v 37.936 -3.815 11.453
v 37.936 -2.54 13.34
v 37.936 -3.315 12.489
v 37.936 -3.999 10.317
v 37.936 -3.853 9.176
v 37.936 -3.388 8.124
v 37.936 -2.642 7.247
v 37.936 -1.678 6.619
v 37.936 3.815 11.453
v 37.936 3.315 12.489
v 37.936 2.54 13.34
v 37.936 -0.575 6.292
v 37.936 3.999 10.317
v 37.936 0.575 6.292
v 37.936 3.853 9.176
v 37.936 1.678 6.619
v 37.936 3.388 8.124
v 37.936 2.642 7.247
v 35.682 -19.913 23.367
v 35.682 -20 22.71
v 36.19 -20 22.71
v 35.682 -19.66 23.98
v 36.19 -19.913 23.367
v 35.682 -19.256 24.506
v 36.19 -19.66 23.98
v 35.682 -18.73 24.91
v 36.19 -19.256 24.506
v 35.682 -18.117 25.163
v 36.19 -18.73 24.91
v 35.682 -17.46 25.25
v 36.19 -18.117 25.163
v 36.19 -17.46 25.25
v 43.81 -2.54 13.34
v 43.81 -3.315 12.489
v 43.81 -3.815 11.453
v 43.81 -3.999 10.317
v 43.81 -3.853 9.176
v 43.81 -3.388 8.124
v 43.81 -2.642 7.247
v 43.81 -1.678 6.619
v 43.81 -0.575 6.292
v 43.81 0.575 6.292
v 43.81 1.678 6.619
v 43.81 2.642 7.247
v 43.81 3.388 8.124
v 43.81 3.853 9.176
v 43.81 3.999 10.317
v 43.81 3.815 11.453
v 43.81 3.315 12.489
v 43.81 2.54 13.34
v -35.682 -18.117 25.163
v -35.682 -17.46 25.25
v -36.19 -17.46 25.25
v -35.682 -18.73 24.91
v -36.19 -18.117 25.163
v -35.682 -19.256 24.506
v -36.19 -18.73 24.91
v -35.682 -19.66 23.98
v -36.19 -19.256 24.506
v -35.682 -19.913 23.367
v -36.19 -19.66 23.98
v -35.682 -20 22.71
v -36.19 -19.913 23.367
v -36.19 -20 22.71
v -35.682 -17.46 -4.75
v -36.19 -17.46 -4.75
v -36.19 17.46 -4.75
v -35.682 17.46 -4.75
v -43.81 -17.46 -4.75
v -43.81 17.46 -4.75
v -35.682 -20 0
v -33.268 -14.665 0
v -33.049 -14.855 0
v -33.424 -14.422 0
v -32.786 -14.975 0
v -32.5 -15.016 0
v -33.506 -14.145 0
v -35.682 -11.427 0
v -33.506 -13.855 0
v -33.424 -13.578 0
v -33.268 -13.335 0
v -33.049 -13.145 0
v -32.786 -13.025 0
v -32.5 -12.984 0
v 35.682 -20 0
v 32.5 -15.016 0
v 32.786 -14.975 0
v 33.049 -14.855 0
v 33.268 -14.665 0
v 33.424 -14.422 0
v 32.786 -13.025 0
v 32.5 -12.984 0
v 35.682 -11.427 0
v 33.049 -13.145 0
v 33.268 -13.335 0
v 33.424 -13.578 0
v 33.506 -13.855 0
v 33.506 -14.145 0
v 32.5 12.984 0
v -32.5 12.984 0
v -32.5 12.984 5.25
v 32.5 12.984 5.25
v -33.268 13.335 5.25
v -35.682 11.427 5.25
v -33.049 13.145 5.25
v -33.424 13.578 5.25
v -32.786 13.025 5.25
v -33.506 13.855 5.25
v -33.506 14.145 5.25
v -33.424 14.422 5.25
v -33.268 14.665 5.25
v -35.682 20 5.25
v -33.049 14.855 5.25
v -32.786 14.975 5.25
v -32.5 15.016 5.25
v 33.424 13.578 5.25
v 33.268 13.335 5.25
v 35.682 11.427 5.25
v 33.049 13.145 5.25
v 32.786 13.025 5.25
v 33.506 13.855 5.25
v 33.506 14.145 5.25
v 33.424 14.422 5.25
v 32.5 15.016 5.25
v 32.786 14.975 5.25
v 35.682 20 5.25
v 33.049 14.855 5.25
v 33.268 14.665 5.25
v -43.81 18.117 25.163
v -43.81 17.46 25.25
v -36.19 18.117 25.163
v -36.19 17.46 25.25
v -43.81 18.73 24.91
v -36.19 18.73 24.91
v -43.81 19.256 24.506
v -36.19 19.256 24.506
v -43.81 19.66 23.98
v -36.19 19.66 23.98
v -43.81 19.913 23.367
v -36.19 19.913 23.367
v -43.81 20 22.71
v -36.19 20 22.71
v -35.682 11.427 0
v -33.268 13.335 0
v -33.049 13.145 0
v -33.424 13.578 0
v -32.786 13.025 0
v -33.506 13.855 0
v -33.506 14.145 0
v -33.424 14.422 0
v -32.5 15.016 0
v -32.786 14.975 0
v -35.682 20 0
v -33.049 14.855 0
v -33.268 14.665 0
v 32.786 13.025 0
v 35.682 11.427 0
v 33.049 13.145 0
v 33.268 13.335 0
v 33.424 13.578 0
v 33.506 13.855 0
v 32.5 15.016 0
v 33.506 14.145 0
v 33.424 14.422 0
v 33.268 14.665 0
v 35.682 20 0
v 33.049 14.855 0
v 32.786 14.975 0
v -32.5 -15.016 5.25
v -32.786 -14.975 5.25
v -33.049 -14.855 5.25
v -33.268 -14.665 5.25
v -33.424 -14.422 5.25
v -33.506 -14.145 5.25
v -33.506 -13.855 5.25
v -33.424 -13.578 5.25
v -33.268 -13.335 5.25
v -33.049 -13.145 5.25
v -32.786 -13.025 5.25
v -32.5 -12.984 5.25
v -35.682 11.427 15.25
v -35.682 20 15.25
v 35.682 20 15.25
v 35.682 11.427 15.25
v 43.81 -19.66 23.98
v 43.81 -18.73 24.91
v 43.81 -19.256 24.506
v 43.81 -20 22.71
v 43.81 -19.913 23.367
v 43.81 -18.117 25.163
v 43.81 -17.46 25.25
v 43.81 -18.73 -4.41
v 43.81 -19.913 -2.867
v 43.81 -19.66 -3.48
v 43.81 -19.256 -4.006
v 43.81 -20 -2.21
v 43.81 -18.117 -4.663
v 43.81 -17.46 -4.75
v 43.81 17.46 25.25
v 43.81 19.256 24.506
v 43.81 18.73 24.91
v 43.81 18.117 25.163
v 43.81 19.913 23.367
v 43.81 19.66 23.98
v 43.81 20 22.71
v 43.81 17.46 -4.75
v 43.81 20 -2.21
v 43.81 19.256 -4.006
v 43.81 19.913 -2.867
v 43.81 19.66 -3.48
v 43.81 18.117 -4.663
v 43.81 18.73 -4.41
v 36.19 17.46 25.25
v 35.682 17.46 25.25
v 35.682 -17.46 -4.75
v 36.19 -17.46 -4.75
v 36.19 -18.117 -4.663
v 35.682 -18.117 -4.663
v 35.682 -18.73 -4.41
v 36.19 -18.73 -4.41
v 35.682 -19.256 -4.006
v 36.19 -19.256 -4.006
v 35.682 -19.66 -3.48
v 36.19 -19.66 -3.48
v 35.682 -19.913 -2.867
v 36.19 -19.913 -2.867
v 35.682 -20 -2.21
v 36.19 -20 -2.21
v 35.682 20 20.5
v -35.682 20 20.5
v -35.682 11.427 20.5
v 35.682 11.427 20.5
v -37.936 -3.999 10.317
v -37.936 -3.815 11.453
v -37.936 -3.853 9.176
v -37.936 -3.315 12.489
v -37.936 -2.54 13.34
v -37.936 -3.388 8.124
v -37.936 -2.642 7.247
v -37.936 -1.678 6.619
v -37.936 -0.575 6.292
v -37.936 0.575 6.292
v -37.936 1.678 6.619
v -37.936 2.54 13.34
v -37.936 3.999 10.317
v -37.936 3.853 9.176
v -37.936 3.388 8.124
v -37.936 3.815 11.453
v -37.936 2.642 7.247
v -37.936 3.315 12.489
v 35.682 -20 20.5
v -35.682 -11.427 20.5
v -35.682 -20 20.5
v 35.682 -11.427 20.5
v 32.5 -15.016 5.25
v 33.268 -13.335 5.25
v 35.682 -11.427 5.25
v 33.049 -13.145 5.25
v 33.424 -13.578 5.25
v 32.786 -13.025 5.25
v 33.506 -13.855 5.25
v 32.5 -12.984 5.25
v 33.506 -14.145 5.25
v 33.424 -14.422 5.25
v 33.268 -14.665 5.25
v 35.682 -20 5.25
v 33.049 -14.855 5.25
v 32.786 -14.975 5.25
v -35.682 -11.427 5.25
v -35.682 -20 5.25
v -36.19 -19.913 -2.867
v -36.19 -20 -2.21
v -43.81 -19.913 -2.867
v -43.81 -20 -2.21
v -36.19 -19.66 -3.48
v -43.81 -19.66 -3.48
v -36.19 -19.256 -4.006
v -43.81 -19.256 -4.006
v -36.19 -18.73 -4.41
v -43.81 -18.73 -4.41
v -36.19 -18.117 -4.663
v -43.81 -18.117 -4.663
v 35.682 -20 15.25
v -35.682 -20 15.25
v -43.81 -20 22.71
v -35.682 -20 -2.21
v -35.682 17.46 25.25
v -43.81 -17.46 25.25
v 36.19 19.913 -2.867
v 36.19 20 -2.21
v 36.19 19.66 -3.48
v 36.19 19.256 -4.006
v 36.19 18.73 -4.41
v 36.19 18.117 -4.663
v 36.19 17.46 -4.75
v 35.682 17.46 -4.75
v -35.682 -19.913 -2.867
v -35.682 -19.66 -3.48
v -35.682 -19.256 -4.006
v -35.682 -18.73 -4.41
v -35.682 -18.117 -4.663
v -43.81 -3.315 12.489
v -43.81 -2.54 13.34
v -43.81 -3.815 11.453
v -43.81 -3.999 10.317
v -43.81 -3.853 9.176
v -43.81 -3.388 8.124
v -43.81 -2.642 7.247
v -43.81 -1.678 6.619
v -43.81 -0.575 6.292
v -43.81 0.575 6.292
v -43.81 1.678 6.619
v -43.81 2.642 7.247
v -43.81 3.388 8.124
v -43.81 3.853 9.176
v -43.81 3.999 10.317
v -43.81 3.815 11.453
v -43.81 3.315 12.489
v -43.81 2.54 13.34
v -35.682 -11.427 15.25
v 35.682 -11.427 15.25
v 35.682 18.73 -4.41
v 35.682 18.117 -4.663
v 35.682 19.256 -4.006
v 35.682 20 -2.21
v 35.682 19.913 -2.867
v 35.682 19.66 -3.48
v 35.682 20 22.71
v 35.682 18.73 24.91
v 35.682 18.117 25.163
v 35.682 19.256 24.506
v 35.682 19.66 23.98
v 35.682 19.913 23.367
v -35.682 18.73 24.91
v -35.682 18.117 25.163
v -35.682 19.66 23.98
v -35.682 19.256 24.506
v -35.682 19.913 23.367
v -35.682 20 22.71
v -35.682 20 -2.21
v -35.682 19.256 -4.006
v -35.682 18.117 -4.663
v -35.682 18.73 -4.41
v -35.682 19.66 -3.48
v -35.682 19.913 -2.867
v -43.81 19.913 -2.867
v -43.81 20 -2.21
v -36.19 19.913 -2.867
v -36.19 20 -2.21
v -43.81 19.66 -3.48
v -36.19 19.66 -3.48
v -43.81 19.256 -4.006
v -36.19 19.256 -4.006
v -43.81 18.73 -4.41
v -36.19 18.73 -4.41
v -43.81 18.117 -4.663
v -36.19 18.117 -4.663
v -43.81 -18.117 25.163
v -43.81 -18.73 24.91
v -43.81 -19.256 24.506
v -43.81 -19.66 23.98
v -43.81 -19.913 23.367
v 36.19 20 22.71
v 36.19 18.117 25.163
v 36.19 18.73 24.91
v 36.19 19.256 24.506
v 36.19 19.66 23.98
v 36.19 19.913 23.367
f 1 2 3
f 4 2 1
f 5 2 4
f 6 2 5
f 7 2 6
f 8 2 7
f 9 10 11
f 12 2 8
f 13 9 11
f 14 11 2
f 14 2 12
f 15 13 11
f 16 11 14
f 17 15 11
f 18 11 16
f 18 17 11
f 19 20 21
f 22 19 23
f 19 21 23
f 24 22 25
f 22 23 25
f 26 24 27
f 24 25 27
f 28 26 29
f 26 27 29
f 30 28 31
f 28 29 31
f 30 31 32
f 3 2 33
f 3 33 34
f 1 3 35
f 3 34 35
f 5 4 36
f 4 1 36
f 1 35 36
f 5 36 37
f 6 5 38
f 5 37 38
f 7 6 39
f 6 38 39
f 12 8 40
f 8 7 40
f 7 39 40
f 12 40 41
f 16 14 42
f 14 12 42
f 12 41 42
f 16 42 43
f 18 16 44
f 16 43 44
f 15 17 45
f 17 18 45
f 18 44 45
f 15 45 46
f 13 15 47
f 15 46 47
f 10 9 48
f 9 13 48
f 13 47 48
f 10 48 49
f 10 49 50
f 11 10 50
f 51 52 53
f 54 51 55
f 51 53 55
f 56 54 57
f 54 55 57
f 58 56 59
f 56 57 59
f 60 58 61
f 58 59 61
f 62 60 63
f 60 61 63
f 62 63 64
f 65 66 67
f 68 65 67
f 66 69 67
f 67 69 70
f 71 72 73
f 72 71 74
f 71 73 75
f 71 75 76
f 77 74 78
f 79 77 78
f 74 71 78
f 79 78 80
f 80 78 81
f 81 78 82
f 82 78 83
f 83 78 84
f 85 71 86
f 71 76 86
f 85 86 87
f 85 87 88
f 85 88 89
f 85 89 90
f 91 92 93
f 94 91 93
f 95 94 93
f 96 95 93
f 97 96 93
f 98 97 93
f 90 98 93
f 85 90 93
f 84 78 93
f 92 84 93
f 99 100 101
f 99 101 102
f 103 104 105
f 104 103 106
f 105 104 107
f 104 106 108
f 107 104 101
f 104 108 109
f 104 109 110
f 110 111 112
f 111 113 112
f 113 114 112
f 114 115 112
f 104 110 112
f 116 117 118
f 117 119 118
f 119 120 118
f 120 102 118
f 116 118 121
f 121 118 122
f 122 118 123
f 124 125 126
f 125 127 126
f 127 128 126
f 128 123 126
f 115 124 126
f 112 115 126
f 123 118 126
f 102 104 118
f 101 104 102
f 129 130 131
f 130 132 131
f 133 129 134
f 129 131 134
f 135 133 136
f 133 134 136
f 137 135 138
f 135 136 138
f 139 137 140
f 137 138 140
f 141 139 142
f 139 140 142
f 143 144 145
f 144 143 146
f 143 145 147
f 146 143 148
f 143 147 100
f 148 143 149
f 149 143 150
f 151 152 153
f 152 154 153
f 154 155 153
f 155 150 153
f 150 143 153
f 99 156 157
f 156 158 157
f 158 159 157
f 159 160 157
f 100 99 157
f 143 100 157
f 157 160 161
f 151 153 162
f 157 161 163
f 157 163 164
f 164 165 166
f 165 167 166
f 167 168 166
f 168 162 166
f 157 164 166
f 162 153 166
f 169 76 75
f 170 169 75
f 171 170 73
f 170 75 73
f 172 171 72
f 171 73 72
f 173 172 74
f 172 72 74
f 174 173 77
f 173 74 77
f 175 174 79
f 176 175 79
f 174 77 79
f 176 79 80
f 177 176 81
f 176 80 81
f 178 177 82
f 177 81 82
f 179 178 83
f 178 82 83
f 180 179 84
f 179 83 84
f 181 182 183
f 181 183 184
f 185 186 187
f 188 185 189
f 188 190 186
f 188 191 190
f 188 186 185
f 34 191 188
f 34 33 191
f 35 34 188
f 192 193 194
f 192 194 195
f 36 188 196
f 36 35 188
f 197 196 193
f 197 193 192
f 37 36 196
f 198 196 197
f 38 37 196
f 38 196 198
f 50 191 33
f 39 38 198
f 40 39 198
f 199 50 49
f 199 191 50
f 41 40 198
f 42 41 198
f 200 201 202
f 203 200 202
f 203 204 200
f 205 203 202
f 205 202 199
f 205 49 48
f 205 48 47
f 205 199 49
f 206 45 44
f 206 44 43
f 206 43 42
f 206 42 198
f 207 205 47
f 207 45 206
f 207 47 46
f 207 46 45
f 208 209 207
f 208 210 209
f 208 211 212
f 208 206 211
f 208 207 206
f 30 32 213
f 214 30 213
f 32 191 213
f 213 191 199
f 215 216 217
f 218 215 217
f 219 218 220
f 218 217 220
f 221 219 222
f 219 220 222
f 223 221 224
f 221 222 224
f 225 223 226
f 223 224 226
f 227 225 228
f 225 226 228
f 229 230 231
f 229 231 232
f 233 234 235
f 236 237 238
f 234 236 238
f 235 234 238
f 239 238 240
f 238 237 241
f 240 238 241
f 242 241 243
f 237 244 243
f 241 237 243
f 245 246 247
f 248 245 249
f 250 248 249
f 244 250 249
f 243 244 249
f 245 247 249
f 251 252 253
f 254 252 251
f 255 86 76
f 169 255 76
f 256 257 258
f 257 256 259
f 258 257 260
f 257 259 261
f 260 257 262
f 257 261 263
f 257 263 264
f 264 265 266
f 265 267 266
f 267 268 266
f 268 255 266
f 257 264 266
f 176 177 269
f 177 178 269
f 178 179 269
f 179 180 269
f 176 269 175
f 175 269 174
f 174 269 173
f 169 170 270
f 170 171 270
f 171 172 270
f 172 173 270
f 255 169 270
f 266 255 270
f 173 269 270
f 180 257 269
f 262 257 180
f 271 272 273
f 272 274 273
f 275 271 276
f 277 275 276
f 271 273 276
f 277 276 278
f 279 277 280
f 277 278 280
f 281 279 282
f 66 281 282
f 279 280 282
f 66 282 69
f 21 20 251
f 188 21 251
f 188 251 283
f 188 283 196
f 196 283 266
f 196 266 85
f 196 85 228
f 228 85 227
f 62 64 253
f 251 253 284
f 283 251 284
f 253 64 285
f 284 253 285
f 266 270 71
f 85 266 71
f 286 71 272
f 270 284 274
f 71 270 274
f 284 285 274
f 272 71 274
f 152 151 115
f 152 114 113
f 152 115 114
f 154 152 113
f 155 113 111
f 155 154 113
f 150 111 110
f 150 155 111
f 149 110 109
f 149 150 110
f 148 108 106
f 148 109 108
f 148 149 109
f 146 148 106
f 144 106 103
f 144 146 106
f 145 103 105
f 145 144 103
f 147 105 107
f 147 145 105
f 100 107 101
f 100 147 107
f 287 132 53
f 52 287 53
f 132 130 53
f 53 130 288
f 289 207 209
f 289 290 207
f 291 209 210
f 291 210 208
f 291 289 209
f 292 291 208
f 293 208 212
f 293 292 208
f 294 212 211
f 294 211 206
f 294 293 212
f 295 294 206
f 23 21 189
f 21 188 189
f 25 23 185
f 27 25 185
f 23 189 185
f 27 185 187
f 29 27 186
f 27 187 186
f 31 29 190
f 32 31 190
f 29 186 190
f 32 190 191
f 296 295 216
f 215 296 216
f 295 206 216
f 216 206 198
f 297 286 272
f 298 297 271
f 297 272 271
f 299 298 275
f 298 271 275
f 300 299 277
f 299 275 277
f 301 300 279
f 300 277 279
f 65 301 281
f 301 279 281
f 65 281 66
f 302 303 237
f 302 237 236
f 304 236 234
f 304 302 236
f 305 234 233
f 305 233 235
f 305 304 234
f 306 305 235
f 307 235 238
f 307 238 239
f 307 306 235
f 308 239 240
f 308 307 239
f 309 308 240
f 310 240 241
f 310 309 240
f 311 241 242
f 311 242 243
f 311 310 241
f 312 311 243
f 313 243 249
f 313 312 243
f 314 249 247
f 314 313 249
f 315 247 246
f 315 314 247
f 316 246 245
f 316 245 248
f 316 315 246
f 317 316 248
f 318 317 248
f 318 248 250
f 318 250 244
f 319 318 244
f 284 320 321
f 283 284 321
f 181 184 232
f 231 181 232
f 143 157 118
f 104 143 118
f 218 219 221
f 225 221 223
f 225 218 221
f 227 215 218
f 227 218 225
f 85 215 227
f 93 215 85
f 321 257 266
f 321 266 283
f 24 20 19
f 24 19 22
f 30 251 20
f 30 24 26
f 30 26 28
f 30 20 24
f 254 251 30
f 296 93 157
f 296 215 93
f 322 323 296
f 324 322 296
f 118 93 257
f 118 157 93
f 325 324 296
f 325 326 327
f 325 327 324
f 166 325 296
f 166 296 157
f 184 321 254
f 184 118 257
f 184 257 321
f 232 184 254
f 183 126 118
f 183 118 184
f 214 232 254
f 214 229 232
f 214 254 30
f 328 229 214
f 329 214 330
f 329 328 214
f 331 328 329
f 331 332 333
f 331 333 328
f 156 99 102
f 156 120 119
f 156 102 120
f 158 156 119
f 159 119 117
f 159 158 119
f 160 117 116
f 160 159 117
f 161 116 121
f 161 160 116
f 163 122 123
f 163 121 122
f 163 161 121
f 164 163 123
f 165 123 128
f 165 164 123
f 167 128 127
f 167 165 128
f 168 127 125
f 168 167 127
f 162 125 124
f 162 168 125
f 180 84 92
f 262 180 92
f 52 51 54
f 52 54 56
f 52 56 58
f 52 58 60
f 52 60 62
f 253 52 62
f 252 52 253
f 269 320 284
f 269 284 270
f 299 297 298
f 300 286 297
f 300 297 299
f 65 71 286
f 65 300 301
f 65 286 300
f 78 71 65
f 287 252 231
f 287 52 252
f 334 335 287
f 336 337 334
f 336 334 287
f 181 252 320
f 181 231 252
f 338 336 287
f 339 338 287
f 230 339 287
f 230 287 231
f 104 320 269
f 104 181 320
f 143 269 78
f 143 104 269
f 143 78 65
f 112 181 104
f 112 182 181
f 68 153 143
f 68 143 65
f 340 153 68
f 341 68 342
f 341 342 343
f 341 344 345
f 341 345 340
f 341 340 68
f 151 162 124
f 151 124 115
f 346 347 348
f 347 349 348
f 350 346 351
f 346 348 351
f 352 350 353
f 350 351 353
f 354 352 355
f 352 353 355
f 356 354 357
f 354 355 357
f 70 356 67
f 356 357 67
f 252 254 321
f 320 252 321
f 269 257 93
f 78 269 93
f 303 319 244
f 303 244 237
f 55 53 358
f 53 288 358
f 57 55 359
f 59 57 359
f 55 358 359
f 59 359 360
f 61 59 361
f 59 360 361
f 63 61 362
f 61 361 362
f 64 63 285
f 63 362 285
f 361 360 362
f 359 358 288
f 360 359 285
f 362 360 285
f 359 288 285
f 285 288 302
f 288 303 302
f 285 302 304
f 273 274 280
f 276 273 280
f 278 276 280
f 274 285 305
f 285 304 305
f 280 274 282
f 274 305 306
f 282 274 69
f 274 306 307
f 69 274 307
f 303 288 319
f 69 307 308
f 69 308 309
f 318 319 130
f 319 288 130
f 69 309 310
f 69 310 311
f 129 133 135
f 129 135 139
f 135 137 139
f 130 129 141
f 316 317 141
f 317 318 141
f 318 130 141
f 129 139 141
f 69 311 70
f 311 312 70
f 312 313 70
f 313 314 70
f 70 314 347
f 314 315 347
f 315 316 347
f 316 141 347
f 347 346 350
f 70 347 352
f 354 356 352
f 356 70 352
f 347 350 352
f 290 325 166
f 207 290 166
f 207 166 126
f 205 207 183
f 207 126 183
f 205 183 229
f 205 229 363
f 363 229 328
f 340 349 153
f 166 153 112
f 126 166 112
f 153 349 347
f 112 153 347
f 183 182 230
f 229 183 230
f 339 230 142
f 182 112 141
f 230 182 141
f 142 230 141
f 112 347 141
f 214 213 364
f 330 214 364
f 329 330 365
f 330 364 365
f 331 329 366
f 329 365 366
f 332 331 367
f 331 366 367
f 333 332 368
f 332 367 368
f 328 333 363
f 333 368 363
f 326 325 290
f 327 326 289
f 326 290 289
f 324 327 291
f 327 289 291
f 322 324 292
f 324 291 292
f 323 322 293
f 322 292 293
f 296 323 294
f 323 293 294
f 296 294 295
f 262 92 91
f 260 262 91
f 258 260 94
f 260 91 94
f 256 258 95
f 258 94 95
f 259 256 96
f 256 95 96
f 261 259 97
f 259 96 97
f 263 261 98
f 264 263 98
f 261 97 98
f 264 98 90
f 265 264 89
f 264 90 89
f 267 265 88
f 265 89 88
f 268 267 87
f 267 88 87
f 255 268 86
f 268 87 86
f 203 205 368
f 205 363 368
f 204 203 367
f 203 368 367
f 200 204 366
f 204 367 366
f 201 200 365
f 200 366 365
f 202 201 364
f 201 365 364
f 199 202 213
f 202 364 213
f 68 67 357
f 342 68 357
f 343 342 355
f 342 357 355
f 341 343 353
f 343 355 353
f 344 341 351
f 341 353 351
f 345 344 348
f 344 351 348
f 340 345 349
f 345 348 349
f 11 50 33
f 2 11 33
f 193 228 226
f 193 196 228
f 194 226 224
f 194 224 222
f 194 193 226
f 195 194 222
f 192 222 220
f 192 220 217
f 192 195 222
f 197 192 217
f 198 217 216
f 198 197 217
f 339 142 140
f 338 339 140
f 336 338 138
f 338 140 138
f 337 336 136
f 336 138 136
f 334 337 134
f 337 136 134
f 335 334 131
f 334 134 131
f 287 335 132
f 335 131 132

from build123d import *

# Parameters (mm, degrees)
SKETCH1_W               = 80
SKETCH1_H               = 40
BOSS_EXTRUDE1_DEPTH     = 20.5
SKETCH2_W               = 66.73316624
SKETCH2_H               = 22.854
CUT_EXTRUDE1_DEPTH      = 21.5
SKETCH3_W               = 30
SKETCH3_H               = 40
BOSS_EXTRUDE2_DEPTH     = 3.81
SKETCH4_R               = 4
CUT_EXTRUDE2_DEPTH      = 5.87375
SKETCH6_W               = 66.73316624
SKETCH6_H               = 10
CUT_EXTRUDE4_DEPTH      = 32.427
CUT_EXTRUDE4_DEPTH_BACK = 9.573
FILLET4_R               = 2.54
CUT_EXTRUDE5_DEPTH      = 5.25
BOSS_EXTRUDE3_DEPTH     = 5.87375
BOSS_EXTRUDE4_DEPTH     = 5.87375
CUT_EXTRUDE6_DEPTH      = 2.823417
CUT_EXTRUDE7_DEPTH      = 2.823417
BOSS_EXTRUDE5_DEPTH     = 0.508
BOSS_EXTRUDE6_DEPTH     = 0.508


with BuildPart() as part:
    # Sketch1 → Boss-Extrude1 (new body)
    with BuildSketch(Plane.XY):
        Rectangle(SKETCH1_W, SKETCH1_H)
    extrude(amount=BOSS_EXTRUDE1_DEPTH)

    # Sketch2 → Cut-Extrude1 (cut, through all)
    with BuildSketch(Plane.XY.offset(20.5)):
        Rectangle(SKETCH2_W, SKETCH2_H)
    extrude(amount=-CUT_EXTRUDE1_DEPTH, mode=Mode.SUBTRACT)

    # Sketch3 → Boss-Extrude2 (add, symmetric)
    with BuildSketch(Plane(origin=(40, 0, 0), x_dir=(0, 0, -1), z_dir=(1, 0, 0))):
        with Locations((-10.25, 0)):
            Rectangle(SKETCH3_W, SKETCH3_H)
    boss_extrude2 = extrude(amount=BOSS_EXTRUDE2_DEPTH, both=True)

    # Mirror1: Boss-Extrude2 across plane
    add(boss_extrude2.mirror(Plane(origin=(0, 0, 0), x_dir=(0, 0, 1), z_dir=(1, 0, 0))))

    # Sketch4 → Cut-Extrude2 (cut)
    with BuildSketch(Plane(origin=(43.81, 0, 0), x_dir=(0, 0, -1), z_dir=(1, 0, 0))):
        with Locations((-10.25, 0)):
            Circle(SKETCH4_R)
    cut_extrude2 = extrude(amount=-CUT_EXTRUDE2_DEPTH, mode=Mode.SUBTRACT)

    # Mirror2: Cut-Extrude2 across plane
    add(cut_extrude2.mirror(Plane(origin=(0, 0, 0), x_dir=(0, 0, 1), z_dir=(1, 0, 0))), mode=Mode.SUBTRACT)

    # Sketch6 → Cut-Extrude4 (cut, two sides)
    with BuildSketch(Plane(origin=(0, -11.427, 0), x_dir=(1, 0, 0), z_dir=(0, 1, 0))) as cut_extrude4_sk:
        with Locations((0, -10.25)):
            Rectangle(SKETCH6_W, SKETCH6_H)
    extrude(amount=CUT_EXTRUDE4_DEPTH, mode=Mode.SUBTRACT)
    extrude(cut_extrude4_sk.sketch, amount=-CUT_EXTRUDE4_DEPTH_BACK, mode=Mode.SUBTRACT)

    # Fillet4
    fillet4_edges = [part.edges().sort_by_distance(p)[0] for p in [
        (40, 20, 25.25),
        (40, -20, 25.25),
        (40, -20, -4.75),
        (40, 20, -4.75),
        (-40, -20, 25.25),
        (-40, 20, 25.25),
        (-40, 20, -4.75),
        (-40, -20, -4.75),
    ]]
    fillet(fillet4_edges, radius=FILLET4_R)

    # Sketch7 → Cut-Extrude5 (cut)
    with BuildSketch(Plane(origin=(0, 0, 0), x_dir=(-1, 0, 0), z_dir=(0, 0, -1))):
        with BuildLine():
            Line((-32.5, 15.016), (32.5, 15.016))
            ThreePointArc((32.5, 15.016), (33.516, 14), (32.5, 12.984))
            Line((32.5, 12.984), (-32.5, 12.984))
            ThreePointArc((-32.5, 12.984), (-33.516, 14), (-32.5, 15.016))
        make_face()
    cut_extrude5 = extrude(amount=-CUT_EXTRUDE5_DEPTH, mode=Mode.SUBTRACT)

    # Mirror3: Cut-Extrude5 across plane
    add(cut_extrude5.mirror(Plane.ZX), mode=Mode.SUBTRACT)

    # Sketch8 → Boss-Extrude3 (add)
    with BuildSketch(Plane(origin=(43.81, 0, 0), x_dir=(0, 0, -1), z_dir=(1, 0, 0))):
        with BuildLine():
            Line((-13.340048543, 2.54), (-13.340048543, -2.54))
            ThreePointArc((-13.340048543, -2.54), (-14.25, 0), (-13.340048543, 2.54))
        make_face()
    extrude(amount=-BOSS_EXTRUDE3_DEPTH)

    # Sketch9 → Boss-Extrude4 (add)
    with BuildSketch(Plane.ZY.offset(43.81)):
        with BuildLine():
            Line((13.340048543, 2.54), (13.340048543, -2.54))
            ThreePointArc((13.340048543, -2.54), (14.25, 0), (13.340048543, 2.54))
        make_face()
    extrude(amount=-BOSS_EXTRUDE4_DEPTH)

    # Sketch10 → Cut-Extrude6 (cut)
    with BuildSketch(Plane.ZY.offset(-33.36658312)):
        Polygon((20.5, 11.427), (15.25, 11.427), (15.25, 20), (5.25, 20), (5.25, 14.53036751), (5.25, 13.46963249), (5.25, 11.427), (0, 11.427), (0, -11.427), (5.25, -11.427), (5.25, -13.46963249), (5.25, -14.53036751), (5.25, -20), (15.25, -20), (15.25, -11.427), (20.5, -11.427), align=None)
    extrude(amount=-CUT_EXTRUDE6_DEPTH, mode=Mode.SUBTRACT)

    # Sketch11 → Cut-Extrude7 (cut)
    with BuildSketch(Plane(origin=(-33.36658312, 0, 0), x_dir=(0, 0, -1), z_dir=(1, 0, 0))):
        Polygon((-20.5, -11.427), (-15.25, -11.427), (-15.25, -20), (-5.25, -20), (-5.25, -14.53036751), (-5.25, -13.46963249), (-5.25, -11.427), (0, -11.427), (0, 11.427), (-5.25, 11.427), (-5.25, 13.46963249), (-5.25, 14.53036751), (-5.25, 20), (-15.25, 20), (-15.25, 11.427), (-20.5, 11.427), align=None)
    extrude(amount=-CUT_EXTRUDE7_DEPTH, mode=Mode.SUBTRACT)

    # Sketch12 → Boss-Extrude5 (add)
    with BuildSketch(Plane.ZY.offset(-36.19)):
        with BuildLine():
            Line((-4.75, 17.46), (-4.75, -17.46))
            ThreePointArc((-4.75, -17.46), (-4.006051224, -19.256051224), (-2.21, -20))
            Line((-2.21, -20), (0, -20))
            Line((0, -20), (0, -11.427))
            Line((0, -11.427), (5.25, -11.427))
            Line((5.25, -11.427), (5.25, -20))
            Line((5.25, -20), (15.25, -20))
            Line((15.25, -20), (15.25, -11.427))
            Line((15.25, -11.427), (20.5, -11.427))
            Line((20.5, -11.427), (20.5, -20))
            Line((20.5, -20), (22.71, -20))
            ThreePointArc((22.71, -20), (24.506051224, -19.256051224), (25.25, -17.46))
            Line((25.25, -17.46), (25.25, 17.46))
            ThreePointArc((25.25, 17.46), (24.506051224, 19.256051224), (22.71, 20))
            Line((22.71, 20), (20.5, 20))
            Line((20.5, 20), (20.5, 11.427))
            Line((20.5, 11.427), (15.25, 11.427))
            Line((15.25, 11.427), (15.25, 20))
            Line((15.25, 20), (5.25, 20))
            Line((5.25, 20), (5.25, 11.427))
            Line((5.25, 11.427), (0, 11.427))
            Line((0, 11.427), (0, 20))
            Line((0, 20), (-2.21, 20))
            ThreePointArc((-2.21, 20), (-4.006051224, 19.256051224), (-4.75, 17.46))
        make_face()
    extrude(amount=BOSS_EXTRUDE5_DEPTH)

    # Sketch13 → Boss-Extrude6 (add)
    with BuildSketch(Plane(origin=(-36.19, 0, 0), x_dir=(0, 0, -1), z_dir=(1, 0, 0))):
        with BuildLine():
            Line((0, -20), (2.21, -20))
            ThreePointArc((2.21, -20), (4.006051224, -19.256051224), (4.75, -17.46))
            Line((4.75, -17.46), (4.75, 17.46))
            ThreePointArc((4.75, 17.46), (4.006051224, 19.256051224), (2.21, 20))
            Line((2.21, 20), (0, 20))
            Line((0, 20), (0, 11.427))
            Line((0, 11.427), (-5.25, 11.427))
            Line((-5.25, 11.427), (-5.25, 20))
            Line((-5.25, 20), (-15.25, 20))
            Line((-15.25, 20), (-15.25, 11.427))
            Line((-15.25, 11.427), (-20.5, 11.427))
            Line((-20.5, 11.427), (-20.5, 20))
            Line((-20.5, 20), (-22.71, 20))
            ThreePointArc((-22.71, 20), (-24.506051224, 19.256051224), (-25.25, 17.46))
            Line((-25.25, 17.46), (-25.25, -17.46))
            ThreePointArc((-25.25, -17.46), (-24.506051224, -19.256051224), (-22.71, -20))
            Line((-22.71, -20), (-20.5, -20))
            Line((-20.5, -20), (-20.5, -11.427))
            Line((-20.5, -11.427), (-15.25, -11.427))
            Line((-15.25, -11.427), (-15.25, -20))
            Line((-15.25, -20), (-5.25, -20))
            Line((-5.25, -20), (-5.25, -11.427))
            Line((-5.25, -11.427), (0, -11.427))
            Line((0, -11.427), (0, -20))
        make_face()
    extrude(amount=BOSS_EXTRUDE6_DEPTH)


solid = part.part
